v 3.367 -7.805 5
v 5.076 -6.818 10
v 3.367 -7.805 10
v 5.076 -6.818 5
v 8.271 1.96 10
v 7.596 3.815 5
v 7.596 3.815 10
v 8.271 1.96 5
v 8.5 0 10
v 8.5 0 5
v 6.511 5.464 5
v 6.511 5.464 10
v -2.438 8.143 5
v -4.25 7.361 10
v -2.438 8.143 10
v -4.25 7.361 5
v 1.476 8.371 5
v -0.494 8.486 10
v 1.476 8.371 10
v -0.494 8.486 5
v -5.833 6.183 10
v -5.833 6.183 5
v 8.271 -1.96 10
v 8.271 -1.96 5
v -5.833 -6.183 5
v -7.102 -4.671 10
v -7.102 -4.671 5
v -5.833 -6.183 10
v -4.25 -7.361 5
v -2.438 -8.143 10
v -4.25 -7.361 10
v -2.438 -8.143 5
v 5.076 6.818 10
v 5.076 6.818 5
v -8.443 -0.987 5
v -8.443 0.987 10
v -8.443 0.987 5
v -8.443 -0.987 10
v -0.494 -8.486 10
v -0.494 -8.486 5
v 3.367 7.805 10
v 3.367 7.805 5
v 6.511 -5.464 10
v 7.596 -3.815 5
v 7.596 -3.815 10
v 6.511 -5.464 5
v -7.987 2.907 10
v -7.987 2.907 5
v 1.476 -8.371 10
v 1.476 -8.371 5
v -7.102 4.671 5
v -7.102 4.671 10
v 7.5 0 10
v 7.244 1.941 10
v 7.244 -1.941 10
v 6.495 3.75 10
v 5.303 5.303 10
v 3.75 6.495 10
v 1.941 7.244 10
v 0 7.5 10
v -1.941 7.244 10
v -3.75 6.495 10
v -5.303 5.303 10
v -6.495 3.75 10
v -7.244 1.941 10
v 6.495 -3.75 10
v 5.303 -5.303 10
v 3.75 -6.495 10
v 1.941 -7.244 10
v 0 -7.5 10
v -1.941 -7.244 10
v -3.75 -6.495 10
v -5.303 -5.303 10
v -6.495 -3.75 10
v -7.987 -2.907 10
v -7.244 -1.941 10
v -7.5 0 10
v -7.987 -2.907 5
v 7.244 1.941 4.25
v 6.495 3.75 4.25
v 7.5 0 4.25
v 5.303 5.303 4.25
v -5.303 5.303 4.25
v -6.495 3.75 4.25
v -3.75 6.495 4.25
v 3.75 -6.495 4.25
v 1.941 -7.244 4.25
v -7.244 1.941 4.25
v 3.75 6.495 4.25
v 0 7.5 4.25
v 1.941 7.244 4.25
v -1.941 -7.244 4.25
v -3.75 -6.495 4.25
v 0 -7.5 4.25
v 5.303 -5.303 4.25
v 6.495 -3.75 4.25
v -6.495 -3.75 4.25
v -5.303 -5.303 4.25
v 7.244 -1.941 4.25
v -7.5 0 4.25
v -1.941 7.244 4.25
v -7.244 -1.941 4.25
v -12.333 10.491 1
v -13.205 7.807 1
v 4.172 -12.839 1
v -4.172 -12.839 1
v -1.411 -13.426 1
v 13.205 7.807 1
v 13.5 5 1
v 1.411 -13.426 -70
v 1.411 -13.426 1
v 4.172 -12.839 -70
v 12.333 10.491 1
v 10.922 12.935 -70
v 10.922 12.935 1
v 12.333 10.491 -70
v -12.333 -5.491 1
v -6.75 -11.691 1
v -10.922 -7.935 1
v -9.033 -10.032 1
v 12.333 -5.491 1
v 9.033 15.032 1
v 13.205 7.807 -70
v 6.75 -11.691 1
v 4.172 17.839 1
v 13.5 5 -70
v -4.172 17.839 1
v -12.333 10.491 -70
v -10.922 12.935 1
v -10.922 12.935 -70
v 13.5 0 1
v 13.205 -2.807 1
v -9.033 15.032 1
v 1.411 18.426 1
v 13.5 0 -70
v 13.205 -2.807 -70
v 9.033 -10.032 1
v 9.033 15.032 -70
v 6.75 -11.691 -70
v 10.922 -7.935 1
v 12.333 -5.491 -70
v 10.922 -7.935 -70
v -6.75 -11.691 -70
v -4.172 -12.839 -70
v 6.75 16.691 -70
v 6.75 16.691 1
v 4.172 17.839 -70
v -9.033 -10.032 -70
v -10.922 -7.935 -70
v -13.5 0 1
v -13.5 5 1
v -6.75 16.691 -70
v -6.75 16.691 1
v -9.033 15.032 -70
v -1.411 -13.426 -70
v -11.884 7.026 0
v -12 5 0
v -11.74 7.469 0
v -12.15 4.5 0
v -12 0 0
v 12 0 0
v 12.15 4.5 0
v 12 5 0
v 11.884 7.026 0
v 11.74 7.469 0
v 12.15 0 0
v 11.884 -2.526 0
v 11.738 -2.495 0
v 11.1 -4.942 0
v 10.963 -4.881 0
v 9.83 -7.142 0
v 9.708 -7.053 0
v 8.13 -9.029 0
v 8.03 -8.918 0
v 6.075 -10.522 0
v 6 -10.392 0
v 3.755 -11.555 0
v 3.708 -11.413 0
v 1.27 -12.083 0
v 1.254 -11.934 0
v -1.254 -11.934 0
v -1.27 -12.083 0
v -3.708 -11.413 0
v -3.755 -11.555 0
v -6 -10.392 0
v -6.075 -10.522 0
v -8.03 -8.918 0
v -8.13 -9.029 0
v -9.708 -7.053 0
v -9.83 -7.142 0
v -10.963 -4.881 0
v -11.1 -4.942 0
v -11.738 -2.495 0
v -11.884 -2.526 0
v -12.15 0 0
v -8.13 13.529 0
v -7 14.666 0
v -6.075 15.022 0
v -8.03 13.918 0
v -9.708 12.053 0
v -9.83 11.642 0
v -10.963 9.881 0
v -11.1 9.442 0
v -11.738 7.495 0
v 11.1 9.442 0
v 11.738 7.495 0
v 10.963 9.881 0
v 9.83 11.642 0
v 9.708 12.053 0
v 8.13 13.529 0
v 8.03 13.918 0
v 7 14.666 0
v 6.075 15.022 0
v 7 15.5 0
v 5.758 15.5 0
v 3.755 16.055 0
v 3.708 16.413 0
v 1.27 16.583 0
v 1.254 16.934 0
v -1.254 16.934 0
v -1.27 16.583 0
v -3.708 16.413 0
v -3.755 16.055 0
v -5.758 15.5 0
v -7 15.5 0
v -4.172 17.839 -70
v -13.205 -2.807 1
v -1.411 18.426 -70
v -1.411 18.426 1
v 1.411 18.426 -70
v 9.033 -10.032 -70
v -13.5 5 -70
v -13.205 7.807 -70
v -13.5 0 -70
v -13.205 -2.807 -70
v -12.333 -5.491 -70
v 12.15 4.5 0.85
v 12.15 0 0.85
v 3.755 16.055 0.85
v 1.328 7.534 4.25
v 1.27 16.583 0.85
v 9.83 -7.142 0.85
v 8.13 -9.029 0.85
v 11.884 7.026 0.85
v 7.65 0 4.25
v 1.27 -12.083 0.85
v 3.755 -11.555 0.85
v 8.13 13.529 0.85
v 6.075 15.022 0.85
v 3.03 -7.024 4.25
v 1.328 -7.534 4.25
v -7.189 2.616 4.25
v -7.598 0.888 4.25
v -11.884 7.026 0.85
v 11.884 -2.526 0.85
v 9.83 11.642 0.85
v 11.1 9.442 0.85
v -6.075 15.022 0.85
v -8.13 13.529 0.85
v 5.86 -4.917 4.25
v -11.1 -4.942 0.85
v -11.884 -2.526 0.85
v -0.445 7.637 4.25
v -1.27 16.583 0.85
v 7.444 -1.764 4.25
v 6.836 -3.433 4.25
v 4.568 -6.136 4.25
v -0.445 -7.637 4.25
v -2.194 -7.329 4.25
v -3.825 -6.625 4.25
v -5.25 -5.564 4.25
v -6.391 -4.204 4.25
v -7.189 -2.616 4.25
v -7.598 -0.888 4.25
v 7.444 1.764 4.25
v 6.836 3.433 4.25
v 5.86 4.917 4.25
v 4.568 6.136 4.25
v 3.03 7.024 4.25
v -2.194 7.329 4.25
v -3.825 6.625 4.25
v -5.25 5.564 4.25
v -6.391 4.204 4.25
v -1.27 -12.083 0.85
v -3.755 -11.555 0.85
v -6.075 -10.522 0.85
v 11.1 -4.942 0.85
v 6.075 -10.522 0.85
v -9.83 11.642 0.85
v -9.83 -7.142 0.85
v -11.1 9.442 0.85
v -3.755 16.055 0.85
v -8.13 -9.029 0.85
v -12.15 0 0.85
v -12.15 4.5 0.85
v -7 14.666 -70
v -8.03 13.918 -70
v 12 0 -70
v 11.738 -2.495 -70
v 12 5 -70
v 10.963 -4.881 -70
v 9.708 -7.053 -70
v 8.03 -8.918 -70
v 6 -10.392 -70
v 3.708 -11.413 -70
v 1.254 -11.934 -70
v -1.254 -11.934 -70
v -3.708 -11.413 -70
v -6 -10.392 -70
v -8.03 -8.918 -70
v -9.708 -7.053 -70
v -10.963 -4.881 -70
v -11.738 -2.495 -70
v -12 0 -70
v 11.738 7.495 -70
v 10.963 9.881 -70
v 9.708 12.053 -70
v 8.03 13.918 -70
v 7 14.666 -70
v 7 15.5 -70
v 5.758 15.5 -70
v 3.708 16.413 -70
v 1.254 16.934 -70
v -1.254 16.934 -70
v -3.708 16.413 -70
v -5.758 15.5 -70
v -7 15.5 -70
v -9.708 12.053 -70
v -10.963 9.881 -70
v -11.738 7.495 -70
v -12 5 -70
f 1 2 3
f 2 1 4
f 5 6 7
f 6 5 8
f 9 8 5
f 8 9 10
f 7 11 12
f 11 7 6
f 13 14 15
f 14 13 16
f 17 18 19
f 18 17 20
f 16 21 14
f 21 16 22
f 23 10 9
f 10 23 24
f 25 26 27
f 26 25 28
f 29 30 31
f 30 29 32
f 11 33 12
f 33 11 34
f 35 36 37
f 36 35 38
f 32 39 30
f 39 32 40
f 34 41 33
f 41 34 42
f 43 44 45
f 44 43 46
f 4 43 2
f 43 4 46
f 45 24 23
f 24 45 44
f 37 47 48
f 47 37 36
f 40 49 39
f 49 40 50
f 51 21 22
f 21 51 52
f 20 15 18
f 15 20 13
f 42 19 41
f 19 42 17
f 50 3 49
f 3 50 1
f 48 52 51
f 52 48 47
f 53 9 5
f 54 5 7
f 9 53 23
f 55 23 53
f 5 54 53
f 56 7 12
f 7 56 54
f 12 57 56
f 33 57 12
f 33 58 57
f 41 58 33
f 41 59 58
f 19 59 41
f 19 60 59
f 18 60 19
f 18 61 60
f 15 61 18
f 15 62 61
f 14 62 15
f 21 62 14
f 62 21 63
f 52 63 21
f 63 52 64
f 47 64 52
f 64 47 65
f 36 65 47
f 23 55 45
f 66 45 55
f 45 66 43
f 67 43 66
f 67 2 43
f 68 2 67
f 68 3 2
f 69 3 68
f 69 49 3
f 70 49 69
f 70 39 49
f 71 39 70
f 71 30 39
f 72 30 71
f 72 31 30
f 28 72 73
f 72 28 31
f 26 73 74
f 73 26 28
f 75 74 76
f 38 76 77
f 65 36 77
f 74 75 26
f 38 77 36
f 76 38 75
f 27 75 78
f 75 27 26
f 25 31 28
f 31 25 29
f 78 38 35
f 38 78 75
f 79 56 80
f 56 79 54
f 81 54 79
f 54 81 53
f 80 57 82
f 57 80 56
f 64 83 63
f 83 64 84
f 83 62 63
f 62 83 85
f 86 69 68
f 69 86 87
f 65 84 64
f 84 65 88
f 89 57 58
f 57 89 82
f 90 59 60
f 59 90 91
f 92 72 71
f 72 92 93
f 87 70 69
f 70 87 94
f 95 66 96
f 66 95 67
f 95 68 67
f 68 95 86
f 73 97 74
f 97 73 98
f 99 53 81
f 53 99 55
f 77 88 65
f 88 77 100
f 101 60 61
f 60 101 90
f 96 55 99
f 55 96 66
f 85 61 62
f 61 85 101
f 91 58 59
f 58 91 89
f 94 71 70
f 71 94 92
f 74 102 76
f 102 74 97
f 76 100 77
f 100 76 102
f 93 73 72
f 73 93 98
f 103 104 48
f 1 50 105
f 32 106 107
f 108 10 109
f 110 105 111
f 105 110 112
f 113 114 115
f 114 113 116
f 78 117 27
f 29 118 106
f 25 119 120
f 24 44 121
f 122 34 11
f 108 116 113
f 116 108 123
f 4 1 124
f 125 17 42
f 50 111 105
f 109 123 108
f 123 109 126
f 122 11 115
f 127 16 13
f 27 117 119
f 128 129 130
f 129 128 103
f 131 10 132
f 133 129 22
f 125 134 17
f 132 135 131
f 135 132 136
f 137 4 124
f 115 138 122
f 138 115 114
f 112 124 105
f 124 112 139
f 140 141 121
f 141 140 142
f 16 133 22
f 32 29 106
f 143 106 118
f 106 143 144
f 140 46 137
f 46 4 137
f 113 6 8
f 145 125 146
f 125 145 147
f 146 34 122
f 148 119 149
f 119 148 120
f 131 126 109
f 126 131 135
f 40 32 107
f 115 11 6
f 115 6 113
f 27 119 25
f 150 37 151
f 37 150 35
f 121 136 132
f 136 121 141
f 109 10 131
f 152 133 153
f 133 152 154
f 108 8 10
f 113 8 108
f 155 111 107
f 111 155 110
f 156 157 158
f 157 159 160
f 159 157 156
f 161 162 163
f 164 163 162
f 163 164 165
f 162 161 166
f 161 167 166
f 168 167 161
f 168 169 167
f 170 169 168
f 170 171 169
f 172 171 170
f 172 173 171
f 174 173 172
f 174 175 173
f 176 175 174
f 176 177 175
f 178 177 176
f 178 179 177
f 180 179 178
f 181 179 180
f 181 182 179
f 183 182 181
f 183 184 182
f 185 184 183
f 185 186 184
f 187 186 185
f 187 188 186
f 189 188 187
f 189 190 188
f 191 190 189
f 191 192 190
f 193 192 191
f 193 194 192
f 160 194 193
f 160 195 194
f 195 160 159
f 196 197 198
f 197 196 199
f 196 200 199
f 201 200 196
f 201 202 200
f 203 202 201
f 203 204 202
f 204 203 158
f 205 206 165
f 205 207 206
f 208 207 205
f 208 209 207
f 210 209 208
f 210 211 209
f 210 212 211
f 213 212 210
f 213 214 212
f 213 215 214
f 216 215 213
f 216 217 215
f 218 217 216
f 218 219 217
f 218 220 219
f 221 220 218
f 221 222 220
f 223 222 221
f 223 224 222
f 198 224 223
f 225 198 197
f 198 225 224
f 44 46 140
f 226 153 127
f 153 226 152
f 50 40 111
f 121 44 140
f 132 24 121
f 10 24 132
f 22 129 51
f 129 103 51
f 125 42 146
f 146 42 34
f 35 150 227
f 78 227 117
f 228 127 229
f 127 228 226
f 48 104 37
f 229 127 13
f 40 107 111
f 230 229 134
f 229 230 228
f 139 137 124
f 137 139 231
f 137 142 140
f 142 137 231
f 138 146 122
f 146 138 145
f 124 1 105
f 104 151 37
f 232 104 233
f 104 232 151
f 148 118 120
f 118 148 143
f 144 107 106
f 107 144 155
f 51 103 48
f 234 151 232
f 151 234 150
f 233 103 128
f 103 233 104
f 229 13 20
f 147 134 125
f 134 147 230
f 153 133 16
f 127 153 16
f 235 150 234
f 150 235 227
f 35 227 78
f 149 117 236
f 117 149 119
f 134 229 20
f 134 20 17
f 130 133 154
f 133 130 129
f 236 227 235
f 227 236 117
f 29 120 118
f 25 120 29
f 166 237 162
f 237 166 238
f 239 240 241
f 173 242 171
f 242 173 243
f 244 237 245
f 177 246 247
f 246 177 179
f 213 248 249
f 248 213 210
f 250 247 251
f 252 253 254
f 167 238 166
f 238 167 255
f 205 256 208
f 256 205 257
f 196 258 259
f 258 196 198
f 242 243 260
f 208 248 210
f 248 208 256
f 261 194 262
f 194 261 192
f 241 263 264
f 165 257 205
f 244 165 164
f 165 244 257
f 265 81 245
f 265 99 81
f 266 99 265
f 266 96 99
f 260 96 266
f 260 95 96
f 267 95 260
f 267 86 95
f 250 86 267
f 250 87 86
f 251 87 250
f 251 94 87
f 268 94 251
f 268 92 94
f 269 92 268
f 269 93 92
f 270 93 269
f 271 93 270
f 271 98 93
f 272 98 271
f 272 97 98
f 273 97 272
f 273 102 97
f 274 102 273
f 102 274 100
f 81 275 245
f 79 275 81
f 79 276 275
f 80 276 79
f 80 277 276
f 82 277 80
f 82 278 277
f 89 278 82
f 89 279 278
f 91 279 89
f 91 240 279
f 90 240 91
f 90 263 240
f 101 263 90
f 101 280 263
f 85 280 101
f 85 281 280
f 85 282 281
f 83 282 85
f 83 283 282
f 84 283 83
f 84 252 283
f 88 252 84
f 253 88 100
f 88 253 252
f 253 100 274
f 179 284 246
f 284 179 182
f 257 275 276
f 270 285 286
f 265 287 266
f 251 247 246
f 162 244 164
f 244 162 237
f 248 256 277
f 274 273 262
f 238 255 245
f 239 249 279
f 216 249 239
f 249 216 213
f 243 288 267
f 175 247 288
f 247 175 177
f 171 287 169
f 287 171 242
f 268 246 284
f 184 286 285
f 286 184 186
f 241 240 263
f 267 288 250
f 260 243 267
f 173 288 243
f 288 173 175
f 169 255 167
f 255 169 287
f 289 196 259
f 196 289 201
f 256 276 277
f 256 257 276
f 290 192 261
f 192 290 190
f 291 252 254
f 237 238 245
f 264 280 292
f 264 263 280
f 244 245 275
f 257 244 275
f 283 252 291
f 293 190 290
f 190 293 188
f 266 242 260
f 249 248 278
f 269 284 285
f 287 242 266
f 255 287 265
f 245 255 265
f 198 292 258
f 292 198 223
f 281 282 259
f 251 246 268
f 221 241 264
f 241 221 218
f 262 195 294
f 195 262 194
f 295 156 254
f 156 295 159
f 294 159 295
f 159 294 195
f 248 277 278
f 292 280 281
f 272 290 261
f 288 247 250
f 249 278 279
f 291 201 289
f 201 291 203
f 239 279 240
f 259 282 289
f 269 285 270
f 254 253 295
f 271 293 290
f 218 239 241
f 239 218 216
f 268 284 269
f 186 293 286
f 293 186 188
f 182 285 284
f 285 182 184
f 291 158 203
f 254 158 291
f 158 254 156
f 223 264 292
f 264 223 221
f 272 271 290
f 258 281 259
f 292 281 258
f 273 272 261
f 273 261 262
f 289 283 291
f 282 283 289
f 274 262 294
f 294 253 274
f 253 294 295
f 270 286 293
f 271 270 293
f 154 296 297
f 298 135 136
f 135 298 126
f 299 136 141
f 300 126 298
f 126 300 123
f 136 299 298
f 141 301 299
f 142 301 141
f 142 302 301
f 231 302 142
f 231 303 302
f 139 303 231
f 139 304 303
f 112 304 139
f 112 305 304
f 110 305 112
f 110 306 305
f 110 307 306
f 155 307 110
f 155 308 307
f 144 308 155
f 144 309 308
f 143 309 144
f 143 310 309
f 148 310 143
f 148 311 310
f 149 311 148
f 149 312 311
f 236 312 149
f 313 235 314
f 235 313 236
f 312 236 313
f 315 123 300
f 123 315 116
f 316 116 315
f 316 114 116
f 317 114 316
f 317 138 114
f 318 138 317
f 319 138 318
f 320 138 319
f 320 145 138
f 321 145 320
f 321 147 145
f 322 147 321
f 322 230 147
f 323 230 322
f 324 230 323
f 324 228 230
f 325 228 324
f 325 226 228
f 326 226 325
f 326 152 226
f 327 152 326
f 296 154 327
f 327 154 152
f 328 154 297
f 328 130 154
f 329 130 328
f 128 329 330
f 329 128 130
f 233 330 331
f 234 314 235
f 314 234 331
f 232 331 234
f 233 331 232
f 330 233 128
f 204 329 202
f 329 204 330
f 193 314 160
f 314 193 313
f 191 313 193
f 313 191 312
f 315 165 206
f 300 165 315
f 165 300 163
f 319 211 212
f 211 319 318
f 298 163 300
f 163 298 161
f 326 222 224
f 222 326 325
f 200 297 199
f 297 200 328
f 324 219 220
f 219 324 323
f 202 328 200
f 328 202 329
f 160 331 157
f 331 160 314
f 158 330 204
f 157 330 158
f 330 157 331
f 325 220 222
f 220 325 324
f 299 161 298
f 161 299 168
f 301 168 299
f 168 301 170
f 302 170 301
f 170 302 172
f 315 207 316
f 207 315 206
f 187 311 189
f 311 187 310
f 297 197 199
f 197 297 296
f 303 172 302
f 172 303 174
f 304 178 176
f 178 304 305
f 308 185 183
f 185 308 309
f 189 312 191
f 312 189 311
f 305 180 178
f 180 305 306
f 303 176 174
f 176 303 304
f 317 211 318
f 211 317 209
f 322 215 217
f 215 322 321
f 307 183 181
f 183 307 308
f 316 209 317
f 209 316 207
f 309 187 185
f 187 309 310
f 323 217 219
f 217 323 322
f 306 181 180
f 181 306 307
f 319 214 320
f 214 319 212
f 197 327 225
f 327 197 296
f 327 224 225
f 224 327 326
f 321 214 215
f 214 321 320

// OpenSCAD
headHeight = 5;
bodyHeight = 70;

module proBody(){
    difference(){
        hull(){
            cylinder(h=bodyHeight,d=27);
            mirror([0,1,0]) translate([0,-5,0]) cylinder(h=bodyHeight,d=27);
        }
        hull(){
            cylinder(h=bodyHeight,d=24);
            mirror([0,1,0]) translate([0,-5,0]) cylinder(h=bodyHeight,d=24);
        }
        translate([-7,5.5,0]) cube([14,10,bodyHeight]);
    }
}

module proHead(){
    translate([0,0,5]) difference(){
        cylinder(h=headHeight,d=17);
        cylinder(h=headHeight,d=15);
    }
    difference(){
        proHeadBody();
        scale([0.9,0.9,0.85]) proHeadBody();
        cylinder(h=5,d=15);
    }
}

module proHeadBody(){
    hull(){
        cylinder(h=5,d=17);
        difference(){
            hull(){
                cylinder(h=1,d=27);
                mirror([0,1,0]) translate([0,-5,0]) cylinder(h=1,d=27);
            }    
        }
    }
}

proHead();
translate([0,0,-bodyHeight]) proBody();
